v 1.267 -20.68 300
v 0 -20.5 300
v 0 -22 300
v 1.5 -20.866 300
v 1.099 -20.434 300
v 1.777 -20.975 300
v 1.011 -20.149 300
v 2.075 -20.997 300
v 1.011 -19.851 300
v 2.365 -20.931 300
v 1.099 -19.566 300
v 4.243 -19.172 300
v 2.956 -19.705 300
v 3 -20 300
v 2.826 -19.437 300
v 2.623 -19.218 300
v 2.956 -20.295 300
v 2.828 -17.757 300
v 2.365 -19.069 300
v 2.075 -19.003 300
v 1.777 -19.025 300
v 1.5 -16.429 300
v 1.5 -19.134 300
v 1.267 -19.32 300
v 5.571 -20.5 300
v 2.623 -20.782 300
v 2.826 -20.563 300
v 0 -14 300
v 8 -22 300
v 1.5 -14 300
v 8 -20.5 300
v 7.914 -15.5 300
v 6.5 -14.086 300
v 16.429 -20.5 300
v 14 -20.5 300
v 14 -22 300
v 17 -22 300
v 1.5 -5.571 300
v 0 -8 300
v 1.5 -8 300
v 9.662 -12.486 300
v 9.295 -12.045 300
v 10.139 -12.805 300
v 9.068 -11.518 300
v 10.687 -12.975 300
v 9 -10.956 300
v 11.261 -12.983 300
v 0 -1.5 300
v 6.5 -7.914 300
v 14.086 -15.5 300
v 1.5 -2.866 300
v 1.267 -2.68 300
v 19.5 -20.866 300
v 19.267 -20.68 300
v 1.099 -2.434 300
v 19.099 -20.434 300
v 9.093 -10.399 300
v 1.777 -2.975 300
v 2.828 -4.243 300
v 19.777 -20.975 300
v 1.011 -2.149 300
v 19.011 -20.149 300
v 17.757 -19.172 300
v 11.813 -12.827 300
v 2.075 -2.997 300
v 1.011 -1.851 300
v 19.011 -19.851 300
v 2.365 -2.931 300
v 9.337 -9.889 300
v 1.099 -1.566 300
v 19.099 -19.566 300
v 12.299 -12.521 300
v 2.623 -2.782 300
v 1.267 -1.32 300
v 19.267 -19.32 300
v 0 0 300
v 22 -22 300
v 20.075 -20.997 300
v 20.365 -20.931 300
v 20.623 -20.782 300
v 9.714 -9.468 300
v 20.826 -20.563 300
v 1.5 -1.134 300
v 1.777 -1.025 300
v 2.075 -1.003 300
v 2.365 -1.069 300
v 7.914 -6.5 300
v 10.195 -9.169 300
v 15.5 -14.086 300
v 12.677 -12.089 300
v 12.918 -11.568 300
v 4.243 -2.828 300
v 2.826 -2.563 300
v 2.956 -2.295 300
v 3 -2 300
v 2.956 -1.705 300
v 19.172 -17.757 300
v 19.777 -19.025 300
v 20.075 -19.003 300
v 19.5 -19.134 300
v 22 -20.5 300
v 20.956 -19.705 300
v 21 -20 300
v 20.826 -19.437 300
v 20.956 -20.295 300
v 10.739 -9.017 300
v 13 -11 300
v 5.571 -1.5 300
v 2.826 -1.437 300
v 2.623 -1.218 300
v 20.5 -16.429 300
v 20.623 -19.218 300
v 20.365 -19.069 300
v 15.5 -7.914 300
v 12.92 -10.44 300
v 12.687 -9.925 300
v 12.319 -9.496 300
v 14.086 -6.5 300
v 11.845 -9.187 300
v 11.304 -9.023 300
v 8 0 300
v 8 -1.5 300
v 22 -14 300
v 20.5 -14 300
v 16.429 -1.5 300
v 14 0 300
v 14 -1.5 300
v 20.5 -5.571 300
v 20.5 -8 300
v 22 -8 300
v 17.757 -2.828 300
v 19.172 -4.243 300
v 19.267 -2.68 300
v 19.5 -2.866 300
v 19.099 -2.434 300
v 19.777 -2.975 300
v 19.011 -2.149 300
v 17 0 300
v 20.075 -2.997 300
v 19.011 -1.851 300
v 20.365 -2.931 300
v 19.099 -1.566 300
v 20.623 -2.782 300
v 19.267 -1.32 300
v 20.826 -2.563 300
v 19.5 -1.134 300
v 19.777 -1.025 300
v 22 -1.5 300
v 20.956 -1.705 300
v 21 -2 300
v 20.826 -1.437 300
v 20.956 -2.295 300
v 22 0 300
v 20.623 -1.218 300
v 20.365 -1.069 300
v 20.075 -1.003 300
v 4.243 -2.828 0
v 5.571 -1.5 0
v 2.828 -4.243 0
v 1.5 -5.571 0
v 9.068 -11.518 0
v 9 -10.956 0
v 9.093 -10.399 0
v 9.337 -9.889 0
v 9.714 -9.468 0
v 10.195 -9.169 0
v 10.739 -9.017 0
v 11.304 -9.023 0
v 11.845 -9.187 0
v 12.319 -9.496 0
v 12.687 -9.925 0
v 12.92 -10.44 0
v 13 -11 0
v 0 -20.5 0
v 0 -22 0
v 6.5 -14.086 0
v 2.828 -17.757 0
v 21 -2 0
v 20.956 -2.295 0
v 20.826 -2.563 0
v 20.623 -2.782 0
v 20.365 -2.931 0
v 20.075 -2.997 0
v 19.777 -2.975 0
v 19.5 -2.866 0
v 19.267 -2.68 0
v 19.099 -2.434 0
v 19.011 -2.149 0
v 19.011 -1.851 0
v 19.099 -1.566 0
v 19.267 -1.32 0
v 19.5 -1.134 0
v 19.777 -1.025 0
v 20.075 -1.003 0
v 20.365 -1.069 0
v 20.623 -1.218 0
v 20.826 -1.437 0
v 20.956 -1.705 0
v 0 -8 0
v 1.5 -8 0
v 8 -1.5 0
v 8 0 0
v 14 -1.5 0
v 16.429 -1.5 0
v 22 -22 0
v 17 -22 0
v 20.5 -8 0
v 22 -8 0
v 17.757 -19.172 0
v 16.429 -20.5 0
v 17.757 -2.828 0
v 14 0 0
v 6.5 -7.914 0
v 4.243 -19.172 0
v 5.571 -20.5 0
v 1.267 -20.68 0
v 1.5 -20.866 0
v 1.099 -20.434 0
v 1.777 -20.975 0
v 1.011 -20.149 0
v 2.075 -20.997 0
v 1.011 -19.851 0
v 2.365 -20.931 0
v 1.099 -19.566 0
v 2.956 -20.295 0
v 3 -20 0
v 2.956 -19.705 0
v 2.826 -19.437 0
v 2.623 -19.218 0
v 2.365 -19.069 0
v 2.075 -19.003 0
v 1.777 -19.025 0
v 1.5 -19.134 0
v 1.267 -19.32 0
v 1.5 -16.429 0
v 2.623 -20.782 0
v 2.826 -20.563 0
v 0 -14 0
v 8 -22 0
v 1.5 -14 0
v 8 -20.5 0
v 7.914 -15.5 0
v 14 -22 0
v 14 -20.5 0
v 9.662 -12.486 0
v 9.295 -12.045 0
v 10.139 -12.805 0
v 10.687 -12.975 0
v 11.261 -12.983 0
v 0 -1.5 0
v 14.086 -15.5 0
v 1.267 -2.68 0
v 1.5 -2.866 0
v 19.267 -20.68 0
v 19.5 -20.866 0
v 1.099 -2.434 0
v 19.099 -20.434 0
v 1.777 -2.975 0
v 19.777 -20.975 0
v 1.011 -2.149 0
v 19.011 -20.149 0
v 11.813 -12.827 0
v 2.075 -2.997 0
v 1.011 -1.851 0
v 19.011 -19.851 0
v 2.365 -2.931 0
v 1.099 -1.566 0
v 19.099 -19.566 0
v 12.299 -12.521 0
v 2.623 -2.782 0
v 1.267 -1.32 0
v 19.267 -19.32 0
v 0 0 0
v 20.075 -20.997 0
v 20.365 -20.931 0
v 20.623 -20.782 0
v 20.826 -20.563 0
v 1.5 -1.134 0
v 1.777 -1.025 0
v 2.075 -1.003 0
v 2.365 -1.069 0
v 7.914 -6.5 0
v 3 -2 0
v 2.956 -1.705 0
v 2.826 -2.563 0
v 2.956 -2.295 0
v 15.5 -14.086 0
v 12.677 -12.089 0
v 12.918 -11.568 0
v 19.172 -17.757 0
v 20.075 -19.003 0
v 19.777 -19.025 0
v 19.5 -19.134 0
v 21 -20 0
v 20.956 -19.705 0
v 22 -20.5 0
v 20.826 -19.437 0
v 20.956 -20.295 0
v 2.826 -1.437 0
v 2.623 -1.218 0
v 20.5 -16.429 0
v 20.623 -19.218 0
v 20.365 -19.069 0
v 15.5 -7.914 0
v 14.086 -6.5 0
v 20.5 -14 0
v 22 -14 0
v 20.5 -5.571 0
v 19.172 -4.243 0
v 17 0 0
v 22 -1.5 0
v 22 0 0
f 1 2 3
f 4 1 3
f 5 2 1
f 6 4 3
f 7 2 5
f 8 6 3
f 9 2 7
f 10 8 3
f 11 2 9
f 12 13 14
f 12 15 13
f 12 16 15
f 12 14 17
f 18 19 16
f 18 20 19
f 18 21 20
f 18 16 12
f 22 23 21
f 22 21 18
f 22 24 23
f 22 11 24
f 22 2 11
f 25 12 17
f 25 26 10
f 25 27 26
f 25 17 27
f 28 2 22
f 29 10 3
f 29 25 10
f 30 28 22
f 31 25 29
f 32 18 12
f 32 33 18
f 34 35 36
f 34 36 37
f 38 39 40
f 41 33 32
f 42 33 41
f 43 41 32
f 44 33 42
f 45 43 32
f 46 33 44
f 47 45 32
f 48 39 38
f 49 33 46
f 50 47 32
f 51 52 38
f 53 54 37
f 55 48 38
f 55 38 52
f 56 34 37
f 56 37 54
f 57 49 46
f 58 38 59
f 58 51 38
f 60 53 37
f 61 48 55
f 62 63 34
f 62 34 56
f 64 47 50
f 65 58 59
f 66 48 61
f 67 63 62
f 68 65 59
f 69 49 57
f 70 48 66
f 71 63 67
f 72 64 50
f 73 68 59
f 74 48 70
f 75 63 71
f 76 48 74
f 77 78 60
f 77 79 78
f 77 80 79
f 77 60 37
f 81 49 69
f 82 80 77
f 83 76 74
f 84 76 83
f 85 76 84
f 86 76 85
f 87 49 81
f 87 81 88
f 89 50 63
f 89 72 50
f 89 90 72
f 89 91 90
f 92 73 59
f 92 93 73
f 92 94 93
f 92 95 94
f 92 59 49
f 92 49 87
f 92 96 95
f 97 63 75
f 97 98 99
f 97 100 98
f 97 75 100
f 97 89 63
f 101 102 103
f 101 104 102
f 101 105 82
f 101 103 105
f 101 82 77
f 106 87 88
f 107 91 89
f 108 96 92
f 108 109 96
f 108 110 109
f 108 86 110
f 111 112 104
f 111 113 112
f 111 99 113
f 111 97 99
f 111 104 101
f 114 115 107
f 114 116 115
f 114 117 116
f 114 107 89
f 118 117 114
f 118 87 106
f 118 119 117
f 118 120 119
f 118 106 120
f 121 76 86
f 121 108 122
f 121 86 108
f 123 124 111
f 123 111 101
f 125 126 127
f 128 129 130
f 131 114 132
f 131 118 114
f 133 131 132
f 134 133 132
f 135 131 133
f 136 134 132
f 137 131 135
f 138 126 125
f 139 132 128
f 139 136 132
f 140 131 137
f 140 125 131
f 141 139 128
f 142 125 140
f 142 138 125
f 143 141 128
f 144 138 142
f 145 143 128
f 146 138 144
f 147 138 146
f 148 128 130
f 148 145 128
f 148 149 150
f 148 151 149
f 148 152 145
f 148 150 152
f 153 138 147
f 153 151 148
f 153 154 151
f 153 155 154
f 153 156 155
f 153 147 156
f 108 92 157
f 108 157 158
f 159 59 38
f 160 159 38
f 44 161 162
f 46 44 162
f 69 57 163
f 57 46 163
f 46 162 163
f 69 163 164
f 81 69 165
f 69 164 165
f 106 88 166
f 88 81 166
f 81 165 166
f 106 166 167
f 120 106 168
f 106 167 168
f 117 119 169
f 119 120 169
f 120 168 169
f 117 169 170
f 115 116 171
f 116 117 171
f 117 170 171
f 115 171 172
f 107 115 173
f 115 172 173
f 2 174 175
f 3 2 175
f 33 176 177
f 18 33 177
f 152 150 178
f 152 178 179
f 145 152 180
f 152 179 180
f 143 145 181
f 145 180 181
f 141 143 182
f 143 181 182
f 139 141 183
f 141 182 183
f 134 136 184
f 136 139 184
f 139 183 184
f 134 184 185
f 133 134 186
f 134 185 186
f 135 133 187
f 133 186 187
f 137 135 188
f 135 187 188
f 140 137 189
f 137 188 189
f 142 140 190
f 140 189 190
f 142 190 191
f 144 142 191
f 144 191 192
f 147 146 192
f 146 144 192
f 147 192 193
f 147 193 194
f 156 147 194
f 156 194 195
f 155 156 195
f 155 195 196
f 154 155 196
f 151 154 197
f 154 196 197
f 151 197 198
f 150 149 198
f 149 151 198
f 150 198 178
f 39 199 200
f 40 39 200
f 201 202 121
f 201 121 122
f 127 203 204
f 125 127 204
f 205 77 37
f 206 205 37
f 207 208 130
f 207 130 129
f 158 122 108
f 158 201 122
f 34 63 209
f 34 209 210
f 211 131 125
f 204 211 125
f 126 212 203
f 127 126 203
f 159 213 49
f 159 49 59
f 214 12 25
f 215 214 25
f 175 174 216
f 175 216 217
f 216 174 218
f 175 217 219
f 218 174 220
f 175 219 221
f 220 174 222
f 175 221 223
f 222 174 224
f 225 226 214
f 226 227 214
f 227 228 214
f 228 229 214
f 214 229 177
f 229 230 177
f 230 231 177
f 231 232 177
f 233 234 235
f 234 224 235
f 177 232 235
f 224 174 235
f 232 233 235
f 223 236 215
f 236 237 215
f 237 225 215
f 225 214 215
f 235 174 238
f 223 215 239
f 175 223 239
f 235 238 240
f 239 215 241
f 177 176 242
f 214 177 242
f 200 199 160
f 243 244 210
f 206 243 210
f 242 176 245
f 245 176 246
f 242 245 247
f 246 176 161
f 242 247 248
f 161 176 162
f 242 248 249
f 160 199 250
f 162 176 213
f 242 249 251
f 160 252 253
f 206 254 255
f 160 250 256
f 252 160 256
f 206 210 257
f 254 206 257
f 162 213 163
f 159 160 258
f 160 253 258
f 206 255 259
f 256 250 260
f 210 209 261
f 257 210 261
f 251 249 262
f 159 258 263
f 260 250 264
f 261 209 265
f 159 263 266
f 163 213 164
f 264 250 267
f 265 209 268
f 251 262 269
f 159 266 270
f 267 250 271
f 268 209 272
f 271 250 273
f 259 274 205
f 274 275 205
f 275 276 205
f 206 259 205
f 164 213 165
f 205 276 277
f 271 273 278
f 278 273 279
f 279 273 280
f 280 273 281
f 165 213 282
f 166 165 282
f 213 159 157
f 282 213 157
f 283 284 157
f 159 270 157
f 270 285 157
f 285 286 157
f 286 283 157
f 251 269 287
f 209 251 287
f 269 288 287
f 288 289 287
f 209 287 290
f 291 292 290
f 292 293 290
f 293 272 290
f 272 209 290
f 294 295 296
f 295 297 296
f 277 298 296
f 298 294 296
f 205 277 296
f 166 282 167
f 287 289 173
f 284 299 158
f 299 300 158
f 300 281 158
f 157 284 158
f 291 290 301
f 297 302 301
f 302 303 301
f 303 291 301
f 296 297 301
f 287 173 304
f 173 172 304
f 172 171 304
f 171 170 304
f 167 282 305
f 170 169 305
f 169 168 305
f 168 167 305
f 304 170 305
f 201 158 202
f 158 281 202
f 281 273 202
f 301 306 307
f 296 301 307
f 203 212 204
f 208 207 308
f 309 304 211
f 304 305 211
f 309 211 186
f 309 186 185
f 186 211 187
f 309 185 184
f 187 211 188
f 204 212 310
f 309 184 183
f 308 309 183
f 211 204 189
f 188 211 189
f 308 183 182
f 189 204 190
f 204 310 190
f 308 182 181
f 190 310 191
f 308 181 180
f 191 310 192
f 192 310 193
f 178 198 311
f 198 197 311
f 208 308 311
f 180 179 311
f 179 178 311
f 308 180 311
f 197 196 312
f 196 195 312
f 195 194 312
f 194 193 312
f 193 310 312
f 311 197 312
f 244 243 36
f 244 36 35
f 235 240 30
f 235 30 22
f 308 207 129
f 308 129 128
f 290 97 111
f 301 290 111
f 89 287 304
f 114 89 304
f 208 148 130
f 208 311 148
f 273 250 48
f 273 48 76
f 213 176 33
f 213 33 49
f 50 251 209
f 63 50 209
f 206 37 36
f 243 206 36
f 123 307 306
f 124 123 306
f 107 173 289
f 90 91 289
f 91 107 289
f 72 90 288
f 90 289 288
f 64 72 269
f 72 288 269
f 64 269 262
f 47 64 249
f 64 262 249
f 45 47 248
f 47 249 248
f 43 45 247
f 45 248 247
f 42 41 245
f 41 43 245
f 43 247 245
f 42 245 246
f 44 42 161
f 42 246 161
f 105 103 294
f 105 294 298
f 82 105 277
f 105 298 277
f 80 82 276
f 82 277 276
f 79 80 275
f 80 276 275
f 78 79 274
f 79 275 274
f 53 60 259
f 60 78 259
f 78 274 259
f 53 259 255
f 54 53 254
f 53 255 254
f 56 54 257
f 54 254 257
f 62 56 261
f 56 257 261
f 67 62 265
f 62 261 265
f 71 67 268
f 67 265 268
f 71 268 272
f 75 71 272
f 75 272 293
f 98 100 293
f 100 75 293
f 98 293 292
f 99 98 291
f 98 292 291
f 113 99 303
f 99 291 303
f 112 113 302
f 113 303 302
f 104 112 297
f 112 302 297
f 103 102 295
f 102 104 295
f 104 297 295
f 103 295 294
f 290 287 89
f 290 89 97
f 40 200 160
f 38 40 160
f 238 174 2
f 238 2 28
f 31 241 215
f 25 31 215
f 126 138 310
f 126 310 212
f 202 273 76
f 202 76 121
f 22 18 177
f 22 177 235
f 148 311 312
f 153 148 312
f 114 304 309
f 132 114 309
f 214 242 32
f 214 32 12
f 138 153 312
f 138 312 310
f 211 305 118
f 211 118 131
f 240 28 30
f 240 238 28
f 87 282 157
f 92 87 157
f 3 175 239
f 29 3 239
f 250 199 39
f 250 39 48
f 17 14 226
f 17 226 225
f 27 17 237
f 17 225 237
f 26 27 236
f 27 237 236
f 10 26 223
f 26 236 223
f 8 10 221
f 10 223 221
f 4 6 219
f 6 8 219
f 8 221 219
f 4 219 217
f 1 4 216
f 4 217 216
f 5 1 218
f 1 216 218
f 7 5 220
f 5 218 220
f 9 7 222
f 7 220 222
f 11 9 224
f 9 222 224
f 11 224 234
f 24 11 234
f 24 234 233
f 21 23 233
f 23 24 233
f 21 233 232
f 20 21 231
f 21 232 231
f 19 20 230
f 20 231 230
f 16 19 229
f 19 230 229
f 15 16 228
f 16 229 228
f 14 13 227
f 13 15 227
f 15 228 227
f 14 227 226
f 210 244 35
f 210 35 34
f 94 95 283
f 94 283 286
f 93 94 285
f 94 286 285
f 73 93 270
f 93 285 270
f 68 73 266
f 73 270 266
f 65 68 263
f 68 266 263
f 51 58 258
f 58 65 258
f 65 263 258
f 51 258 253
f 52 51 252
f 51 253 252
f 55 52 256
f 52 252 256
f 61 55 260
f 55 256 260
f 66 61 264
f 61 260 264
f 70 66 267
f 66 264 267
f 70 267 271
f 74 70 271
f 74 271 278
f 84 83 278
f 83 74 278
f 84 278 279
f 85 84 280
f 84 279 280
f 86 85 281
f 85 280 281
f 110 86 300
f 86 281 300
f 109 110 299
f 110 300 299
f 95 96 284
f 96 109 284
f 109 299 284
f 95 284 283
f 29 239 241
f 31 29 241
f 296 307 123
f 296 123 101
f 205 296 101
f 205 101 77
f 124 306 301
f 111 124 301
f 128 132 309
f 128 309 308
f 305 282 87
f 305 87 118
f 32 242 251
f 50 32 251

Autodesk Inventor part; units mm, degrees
ref_plane "YZ Plane" through (0, 0, 0) normal (1, 0, 0) x (0, 1, 0)
ref_plane "XZ Plane" through (0, 0, 0) normal (0, 1, 0) x (-1, 0, 0)
ref_plane "XY Plane" through (0, 0, 0) normal (0, 0, 1) x (1, 0, 0)
sketch "Sketch1" plane through (0, 0, 0) normal (0, 0, 1) x (1, 0, 0)
  line L0 (0, 0) -> (8, 0)
  line L1 (8, 0) -> (8, -1.5)
  line L2 (8, -1.5) -> (5.5711, -1.5)
  line L3 (0, -1.5) -> (0, 0)
  line L4 (0, 0) -> (5, 0) construction
  line L5 (4.2426, -2.8284) -> (5.5711, -1.5)
  line L6 (6.5, -14.0858) -> (6.5, -7.9142)
  line L7 (7.9142, -6.5) -> (15.5, -6.5)
  line L8 (0, -8) -> (1.5, -8)
  line L9 (1.5, -8) -> (1.5, -5.5711)
  line L10 (11, -11) -> (10.2929, -10.2929) construction
  line L11 (11, -11) -> (10.2929, -11.7071) construction
  line L12 (0, 0) -> (8, 0)
  line L13 (5.5711, -1.5) -> (4.2426, -2.8284)
  line L14 (2.8284, -4.2426) -> (1.5, -5.5711)
  line L15 (7.9142, -6.5) -> (4.2426, -2.8284)
  line L16 (6.5, -7.9142) -> (2.8284, -4.2426)
  circle A0 centre (11, -11) radius 2
  line L17 (11, -11) -> (16.6687, -11) construction
  line L18 (11, -16.9105) -> (11, -11) construction
  line L19 (22, 0) -> (14, 0)
  line L20 (14, 0) -> (14, -1.5)
  line L21 (14, -1.5) -> (16.4289, -1.5)
  line L22 (22, -1.5) -> (22, 0)
  line L23 (22, 0) -> (17, 0)
  line L24 (17.7574, -2.8284) -> (16.4289, -1.5)
  line L25 (15.5, -15.5) -> (15.5, -7.9142)
  line L26 (15.5, -6.5) -> (7.9142, -6.5)
  line L27 (22, -8) -> (20.5, -8)
  line L28 (20.5, -8) -> (20.5, -5.5711)
  line L29 (11, -11) -> (11.7071, -10.2929) construction
  line L30 (11, -11) -> (11.7071, -11.7071) construction
  line L31 (22, 0) -> (14, 0)
  line L32 (16.4289, -1.5) -> (17.7574, -2.8284)
  line L33 (19.1716, -4.2426) -> (20.5, -5.5711)
  line L34 (14.0858, -6.5) -> (17.7574, -2.8284)
  line L35 (15.5, -7.9142) -> (19.1716, -4.2426)
  circle A1 centre (11, -11) radius 2
  line L36 (0, -22) -> (8, -22)
  line L37 (8, -22) -> (8, -20.5)
  line L38 (8, -20.5) -> (5.5711, -20.5)
  line L39 (0, -20.5) -> (0, -22)
  line L40 (0, -22) -> (5, -22) construction
  line L41 (4.2426, -19.1716) -> (5.5711, -20.5)
  line L42 (6.5, -7.9142) -> (6.5, -14.0858)
  line L43 (6.5, -15.5) -> (14.0858, -15.5)
  line L44 (0, -14) -> (1.5, -14)
  line L45 (1.5, -14) -> (1.5, -16.4289)
  line L46 (11, -11) -> (10.2929, -11.7071) construction
  line L47 (11, -11) -> (10.2929, -10.2929) construction
  line L48 (0, -22) -> (8, -22)
  line L49 (5.5711, -20.5) -> (4.2426, -19.1716)
  line L50 (2.8284, -17.7574) -> (1.5, -16.4289)
  line L51 (7.9142, -15.5) -> (4.2426, -19.1716)
  line L52 (6.5, -14.0858) -> (2.8284, -17.7574)
  circle A2 centre (11, -11) radius 2
  line L53 (22, -22) -> (14, -22)
  line L54 (14, -22) -> (14, -20.5)
  line L55 (14, -20.5) -> (16.4289, -20.5)
  line L56 (22, -20.5) -> (22, -22)
  line L57 (22, -22) -> (17, -22)
  line L58 (17.7574, -19.1716) -> (16.4289, -20.5)
  line L59 (20.5, -14) -> (20.5, -16.4289)
  line L60 (15.5, -14.0858) -> (19.1716, -17.7574)
  line L61 (19.1716, -17.7574) -> (20.5, -16.4289)
  line L62 (14.0858, -15.5) -> (17.7574, -19.1716)
  line L63 (16.4289, -20.5) -> (17.7574, -19.1716)
  line L64 (22, -22) -> (14, -22)
  line L65 (22, -14) -> (20.5, -14)
  line L66 (11, -11) -> (11.7071, -11.7071) construction
  line L67 (11, -11) -> (11.7071, -10.2929) construction
  line L68 (14.0858, -15.5) -> (6.5, -15.5)
  line L69 (15.5, -7.9142) -> (15.5, -15.5)
  circle A3 centre (11, -11) radius 2
  line L70 (22, -14) -> (22, -20.5)
  line L71 (22, -1.5) -> (22, -8)
  line L72 (8, 0) -> (0, 0) construction
  line L73 (0, 0) -> (0, -8) construction
  line L74 (9.5858, -11) -> (9.0681, -11.5176)
  line L75 (6.5, -14.0858) -> (2.8284, -17.7574)
  line L76 (0, -22) -> (0, -14)
  line L77 (0, -8) -> (0, 0)
  line L78 (0, 0) -> (2, 0) construction
  line L79 (2, 0) -> (2, -2) construction
  circle A4 centre (2, -2) radius 1
  circle A5 centre (20, -2) radius 1
  circle A6 centre (2, -20) radius 1
  circle A7 centre (20, -20) radius 1
  point P0 (3.5355, -3.5355)
  point P1 (0, -7.0711)
  point P2 (6.5, -6.5)
  point P3 (6.5, -15.5)
  point P4 (1.5, 0)
  point P5 (10.2929, -10.2929)
  point P6 (18.4645, -3.5355)
  point P7 (22, -7.0711)
  point P8 (6.5, -6.5)
  point P9 (20.5, 0)
  point P10 (11.7071, -10.2929)
  point P11 (12.4142, -11)
  point P12 (3.5355, -18.4645)
  point P13 (0, -14.9289)
  point P14 (6.5, -6.5)
  point P15 (1.5, -22)
  point P16 (10.2929, -11.7071)
  point P17 (18.4645, -18.4645)
  point P18 (20.5, -22)
  point P19 (22, -14.9289)
  point P20 (15.5, -6.5)
  point P21 (11.7071, -11.7071)
  dimension "d2" = 8
  dimension "d3" = 1.5
  dimension "d4" = 5
  dimension "d10" = 9
  dimension "d11" = 9
  dimension "d14" = 4
  dimension "d15" = 2
  dimension "d16" = 2
  dimension "d17" = 2
extrude "Extrusion1" add sketch "Sketch1" along normal blind 300
properties part number "extrusion_300"
